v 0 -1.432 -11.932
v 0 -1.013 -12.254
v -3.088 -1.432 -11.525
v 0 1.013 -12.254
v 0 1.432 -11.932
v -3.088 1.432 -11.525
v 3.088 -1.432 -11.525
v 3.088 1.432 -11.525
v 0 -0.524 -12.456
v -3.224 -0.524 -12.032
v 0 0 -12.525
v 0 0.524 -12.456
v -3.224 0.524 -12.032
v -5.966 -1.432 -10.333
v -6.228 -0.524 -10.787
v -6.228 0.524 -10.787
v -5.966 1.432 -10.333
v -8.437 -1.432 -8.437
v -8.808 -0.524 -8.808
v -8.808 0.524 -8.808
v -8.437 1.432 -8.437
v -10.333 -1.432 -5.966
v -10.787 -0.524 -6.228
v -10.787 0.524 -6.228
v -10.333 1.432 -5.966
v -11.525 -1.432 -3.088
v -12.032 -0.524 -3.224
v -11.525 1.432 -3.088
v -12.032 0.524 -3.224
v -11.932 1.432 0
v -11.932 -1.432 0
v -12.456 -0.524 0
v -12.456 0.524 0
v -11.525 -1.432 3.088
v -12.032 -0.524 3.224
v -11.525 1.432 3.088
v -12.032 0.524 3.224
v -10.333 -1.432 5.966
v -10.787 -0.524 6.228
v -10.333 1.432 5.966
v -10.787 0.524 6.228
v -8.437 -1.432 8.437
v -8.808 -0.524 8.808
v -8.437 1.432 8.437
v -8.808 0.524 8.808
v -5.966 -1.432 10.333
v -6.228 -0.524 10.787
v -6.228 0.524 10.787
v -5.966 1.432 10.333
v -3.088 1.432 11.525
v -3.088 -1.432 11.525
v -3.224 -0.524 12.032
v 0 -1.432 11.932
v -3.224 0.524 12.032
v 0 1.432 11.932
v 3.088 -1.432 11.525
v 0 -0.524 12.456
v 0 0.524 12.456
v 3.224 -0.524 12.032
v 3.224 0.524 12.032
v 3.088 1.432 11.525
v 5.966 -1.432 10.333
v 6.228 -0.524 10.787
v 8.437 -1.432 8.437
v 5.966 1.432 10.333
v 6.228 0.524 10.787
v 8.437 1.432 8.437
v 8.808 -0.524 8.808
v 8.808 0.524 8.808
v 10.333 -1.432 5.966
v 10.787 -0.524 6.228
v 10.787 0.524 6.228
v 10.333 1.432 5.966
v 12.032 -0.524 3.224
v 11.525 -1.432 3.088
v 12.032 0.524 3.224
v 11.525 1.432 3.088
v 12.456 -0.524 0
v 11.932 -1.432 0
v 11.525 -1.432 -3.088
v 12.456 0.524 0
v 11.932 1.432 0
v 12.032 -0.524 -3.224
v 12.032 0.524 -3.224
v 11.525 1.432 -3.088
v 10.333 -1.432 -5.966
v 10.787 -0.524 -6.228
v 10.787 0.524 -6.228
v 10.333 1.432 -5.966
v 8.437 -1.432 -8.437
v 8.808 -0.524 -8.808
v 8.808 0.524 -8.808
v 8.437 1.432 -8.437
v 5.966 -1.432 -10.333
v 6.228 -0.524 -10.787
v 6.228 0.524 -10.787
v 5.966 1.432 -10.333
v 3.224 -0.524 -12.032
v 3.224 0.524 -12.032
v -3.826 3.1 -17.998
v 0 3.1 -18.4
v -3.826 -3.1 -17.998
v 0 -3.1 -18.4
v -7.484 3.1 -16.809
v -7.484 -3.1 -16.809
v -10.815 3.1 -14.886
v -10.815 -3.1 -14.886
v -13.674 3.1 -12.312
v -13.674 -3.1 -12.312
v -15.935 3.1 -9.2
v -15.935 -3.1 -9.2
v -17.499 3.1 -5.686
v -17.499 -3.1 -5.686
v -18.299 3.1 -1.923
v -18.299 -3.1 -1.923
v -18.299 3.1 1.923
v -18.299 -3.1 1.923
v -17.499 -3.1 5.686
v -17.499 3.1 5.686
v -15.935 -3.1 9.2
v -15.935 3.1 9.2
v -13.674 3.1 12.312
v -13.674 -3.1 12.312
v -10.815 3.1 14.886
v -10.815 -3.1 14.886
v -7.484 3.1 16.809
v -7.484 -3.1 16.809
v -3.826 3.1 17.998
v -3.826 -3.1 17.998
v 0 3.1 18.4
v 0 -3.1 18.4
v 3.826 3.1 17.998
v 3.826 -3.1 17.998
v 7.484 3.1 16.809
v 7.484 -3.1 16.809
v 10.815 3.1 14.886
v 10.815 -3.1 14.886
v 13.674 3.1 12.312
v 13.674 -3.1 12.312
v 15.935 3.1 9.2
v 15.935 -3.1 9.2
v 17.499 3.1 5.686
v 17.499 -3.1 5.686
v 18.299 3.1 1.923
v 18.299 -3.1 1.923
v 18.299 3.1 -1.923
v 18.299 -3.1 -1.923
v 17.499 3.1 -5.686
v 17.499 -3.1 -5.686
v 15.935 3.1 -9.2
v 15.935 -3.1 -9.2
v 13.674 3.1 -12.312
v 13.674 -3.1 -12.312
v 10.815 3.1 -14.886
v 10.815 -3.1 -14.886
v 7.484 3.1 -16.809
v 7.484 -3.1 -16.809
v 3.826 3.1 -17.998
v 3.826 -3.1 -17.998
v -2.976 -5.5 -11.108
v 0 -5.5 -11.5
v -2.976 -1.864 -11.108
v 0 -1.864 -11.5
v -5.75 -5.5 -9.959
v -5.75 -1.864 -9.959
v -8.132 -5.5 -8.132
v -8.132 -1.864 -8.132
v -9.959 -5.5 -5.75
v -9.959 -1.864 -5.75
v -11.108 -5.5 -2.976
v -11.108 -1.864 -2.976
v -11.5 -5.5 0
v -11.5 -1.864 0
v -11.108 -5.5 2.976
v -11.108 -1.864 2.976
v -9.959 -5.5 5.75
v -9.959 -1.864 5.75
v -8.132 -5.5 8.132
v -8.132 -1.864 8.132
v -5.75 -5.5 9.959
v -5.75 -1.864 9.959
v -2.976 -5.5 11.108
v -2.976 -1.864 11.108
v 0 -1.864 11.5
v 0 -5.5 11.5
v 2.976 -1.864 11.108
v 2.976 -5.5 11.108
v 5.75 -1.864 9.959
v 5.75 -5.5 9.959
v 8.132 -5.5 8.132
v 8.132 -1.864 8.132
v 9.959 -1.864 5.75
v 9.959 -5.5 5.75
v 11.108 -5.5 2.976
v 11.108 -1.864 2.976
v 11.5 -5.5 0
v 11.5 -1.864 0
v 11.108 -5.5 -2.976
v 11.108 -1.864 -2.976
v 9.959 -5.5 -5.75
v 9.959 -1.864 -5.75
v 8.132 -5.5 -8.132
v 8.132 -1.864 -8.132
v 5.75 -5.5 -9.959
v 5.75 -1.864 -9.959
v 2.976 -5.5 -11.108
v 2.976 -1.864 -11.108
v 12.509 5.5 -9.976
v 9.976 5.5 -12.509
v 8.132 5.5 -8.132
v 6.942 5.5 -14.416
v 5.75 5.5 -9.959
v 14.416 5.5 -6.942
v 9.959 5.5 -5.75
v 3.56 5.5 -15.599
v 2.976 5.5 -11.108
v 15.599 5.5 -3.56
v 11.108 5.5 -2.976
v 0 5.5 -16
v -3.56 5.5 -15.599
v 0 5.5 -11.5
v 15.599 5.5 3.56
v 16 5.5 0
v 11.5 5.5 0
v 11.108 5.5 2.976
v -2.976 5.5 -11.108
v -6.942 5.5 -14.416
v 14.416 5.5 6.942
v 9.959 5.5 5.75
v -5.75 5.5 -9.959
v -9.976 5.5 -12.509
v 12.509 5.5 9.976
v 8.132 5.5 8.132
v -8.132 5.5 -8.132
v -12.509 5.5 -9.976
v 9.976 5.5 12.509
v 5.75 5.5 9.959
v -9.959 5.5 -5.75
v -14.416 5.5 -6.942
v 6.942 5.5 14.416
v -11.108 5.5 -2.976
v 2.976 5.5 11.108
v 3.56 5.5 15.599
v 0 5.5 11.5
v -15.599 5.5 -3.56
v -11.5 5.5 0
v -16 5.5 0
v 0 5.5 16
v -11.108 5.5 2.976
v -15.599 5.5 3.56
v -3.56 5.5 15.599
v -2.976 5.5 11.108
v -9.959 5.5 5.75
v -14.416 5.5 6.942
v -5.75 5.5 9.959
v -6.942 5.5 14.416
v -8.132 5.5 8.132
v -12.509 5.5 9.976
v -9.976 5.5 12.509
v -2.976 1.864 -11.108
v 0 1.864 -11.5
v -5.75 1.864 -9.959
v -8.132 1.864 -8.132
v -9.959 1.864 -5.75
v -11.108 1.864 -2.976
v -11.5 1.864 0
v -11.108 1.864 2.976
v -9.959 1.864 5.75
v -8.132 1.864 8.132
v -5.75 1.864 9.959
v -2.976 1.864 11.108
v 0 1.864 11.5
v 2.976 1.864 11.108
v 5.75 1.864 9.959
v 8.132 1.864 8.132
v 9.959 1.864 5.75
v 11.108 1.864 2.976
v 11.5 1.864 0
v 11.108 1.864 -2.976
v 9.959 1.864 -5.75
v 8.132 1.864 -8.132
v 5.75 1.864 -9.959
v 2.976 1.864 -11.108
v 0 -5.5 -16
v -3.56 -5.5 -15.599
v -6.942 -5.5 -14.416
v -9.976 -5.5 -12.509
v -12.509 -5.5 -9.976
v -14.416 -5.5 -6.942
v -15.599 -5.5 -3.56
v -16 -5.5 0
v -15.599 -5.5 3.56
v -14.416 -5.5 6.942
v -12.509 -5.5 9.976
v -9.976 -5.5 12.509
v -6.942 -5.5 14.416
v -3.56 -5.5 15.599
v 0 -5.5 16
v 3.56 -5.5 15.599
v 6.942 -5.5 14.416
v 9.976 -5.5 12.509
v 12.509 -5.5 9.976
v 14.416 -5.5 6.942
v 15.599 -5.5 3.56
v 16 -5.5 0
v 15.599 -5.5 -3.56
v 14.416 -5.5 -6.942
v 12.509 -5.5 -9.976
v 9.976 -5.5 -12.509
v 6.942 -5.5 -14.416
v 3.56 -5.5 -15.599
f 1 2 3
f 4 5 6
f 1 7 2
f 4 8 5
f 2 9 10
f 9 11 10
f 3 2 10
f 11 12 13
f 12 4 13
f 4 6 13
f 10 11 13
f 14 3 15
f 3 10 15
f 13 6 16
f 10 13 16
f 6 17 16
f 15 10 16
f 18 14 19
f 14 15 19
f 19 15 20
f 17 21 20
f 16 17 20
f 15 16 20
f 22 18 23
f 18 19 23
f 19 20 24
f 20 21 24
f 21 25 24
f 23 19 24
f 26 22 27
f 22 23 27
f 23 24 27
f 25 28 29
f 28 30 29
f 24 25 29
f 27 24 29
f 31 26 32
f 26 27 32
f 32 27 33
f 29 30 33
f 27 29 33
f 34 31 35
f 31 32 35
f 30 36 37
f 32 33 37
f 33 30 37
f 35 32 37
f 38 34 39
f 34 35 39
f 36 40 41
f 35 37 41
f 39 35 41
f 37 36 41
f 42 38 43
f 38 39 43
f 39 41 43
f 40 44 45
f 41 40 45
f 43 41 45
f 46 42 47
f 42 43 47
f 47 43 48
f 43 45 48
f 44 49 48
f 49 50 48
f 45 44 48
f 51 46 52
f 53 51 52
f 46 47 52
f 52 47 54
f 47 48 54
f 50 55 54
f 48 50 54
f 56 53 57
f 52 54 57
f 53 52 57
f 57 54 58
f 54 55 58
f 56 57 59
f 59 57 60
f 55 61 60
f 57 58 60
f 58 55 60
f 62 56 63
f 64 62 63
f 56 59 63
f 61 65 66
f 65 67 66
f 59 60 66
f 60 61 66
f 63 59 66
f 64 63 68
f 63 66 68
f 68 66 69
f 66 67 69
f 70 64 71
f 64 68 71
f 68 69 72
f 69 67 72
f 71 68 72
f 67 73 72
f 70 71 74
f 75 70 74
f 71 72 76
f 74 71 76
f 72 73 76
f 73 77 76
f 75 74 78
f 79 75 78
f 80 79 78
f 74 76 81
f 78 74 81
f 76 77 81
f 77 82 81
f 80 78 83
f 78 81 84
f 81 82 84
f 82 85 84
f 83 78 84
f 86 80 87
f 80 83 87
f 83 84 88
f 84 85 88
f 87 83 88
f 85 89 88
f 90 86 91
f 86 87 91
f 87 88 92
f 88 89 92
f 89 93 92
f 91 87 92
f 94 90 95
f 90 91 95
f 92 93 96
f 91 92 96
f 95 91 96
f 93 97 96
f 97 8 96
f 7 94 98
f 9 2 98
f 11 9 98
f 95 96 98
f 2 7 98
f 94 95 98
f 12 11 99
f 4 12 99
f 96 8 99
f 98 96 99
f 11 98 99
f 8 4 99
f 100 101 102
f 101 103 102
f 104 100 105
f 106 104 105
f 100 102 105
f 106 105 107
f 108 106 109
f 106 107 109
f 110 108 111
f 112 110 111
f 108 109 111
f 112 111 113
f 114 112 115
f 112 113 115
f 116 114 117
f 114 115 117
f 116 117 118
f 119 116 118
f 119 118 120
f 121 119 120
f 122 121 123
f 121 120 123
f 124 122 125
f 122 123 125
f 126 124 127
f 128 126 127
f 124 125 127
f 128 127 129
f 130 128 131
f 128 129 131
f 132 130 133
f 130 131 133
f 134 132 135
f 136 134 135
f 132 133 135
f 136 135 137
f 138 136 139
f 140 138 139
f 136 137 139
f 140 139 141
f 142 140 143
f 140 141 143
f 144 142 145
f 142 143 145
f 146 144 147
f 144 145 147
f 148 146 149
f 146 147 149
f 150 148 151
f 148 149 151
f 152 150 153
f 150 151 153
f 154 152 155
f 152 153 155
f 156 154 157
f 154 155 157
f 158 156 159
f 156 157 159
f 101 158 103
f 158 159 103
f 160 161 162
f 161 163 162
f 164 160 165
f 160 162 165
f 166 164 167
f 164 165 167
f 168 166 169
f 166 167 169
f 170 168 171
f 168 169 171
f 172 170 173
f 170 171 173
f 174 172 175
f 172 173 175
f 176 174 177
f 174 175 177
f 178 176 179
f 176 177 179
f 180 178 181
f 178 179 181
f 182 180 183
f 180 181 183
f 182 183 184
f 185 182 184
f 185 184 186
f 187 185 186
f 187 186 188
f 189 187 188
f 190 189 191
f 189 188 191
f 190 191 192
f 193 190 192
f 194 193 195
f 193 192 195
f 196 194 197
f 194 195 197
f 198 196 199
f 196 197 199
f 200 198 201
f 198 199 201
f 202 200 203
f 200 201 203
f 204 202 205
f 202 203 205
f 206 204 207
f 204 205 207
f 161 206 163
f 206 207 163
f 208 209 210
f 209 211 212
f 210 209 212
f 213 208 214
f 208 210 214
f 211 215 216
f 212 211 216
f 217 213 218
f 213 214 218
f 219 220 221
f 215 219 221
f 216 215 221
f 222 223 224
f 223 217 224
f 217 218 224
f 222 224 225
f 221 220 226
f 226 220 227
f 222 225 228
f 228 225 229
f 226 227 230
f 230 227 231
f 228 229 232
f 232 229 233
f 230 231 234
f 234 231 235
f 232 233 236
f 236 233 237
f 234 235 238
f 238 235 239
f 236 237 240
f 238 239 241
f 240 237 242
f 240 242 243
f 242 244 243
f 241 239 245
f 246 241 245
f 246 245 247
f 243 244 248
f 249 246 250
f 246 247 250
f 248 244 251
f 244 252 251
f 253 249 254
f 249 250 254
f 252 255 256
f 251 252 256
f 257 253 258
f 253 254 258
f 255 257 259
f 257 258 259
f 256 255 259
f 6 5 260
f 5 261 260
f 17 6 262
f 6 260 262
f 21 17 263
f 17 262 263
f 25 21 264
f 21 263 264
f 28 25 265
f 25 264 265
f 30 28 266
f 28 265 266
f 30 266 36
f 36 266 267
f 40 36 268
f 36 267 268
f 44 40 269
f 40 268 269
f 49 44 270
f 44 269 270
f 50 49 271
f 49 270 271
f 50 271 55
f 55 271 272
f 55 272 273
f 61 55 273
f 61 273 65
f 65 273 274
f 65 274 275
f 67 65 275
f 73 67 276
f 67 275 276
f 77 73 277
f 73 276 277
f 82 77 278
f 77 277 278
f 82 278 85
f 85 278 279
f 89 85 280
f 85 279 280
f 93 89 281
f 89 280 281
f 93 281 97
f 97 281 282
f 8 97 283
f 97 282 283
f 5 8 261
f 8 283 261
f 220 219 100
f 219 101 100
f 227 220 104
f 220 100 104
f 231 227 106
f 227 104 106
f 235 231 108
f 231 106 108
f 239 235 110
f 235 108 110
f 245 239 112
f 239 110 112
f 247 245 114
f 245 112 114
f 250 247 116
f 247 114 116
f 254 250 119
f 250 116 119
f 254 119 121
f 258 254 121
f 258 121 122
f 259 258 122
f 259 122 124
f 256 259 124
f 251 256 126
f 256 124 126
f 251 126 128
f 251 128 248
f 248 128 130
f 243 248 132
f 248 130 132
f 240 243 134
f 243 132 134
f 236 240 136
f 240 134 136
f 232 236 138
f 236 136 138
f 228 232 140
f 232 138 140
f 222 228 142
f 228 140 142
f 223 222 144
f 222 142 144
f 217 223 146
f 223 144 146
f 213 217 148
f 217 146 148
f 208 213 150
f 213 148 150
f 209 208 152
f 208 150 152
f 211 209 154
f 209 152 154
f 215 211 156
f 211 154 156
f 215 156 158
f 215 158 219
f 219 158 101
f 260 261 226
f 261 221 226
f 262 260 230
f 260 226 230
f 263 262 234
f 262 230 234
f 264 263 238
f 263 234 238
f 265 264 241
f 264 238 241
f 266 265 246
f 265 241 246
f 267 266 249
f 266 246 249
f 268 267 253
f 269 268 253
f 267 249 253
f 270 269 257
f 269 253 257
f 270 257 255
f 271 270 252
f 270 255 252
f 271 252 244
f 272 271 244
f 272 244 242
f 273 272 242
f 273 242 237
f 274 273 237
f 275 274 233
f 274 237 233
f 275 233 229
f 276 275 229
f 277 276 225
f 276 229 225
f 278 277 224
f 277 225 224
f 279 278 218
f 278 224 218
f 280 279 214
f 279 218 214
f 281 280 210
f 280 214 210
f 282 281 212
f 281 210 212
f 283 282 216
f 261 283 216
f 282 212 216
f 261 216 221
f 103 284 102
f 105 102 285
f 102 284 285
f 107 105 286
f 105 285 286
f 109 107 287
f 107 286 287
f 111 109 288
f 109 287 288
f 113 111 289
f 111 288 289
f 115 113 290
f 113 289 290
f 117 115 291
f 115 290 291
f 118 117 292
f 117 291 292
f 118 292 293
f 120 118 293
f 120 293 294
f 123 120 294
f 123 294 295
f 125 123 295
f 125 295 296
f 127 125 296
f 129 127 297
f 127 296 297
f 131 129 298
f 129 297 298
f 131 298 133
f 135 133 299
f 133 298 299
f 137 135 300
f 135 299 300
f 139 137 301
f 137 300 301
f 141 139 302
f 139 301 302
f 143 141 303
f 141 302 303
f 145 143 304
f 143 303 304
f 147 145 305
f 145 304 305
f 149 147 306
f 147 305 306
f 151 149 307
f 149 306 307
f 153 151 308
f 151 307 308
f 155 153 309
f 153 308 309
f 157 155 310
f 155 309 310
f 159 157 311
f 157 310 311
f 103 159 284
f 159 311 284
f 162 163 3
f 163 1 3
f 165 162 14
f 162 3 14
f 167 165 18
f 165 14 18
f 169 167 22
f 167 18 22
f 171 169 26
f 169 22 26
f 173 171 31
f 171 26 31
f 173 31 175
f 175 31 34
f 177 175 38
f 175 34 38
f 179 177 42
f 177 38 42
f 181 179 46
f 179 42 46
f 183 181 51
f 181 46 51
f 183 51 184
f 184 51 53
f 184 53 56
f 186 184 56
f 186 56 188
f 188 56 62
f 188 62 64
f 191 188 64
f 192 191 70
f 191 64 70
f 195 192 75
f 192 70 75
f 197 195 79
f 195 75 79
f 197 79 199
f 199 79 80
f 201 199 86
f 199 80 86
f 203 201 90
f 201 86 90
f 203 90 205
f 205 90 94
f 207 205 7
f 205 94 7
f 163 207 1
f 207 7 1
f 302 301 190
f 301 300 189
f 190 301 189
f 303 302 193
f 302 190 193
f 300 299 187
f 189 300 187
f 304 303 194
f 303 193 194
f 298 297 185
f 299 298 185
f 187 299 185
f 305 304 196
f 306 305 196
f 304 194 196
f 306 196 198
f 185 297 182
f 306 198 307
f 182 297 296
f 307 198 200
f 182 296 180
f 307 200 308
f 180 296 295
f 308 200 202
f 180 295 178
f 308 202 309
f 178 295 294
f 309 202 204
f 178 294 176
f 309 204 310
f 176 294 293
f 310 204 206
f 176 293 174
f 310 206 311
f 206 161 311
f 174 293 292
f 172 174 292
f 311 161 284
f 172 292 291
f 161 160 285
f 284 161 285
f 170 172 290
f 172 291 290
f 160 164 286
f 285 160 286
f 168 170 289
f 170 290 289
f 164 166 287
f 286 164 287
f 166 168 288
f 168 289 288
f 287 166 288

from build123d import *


with BuildPart() as part:
    # Sketch2 → Revolve2 (revolve)
    with BuildSketch(Plane.XY, mode=Mode.PRIVATE) as revolve2_sk:
        with BuildLine():
            ThreePointArc((11.931891232, -1.431891232), (12.525, 0), (11.931891232, 1.431891232))
            Line((11.931891232, 1.431891232), (11.5, 1.863782464))
            Line((11.5, 1.863782464), (11.5, 5.5))
            Line((11.5, 5.5), (16, 5.5))
            Line((16, 5.5), (16, -5.5))
            Line((16, -5.5), (11.5, -5.5))
            Line((11.5, -5.5), (11.5, -1.863782464))
            Line((11.5, -1.863782464), (11.931891232, -1.431891232))
        make_face()
        Polygon((18.4, -3.1), (16, -5.5), (16, 5.5), (18.4, 3.1), align=None)
    revolve(revolve2_sk.sketch.rotate(Axis((0, 0, 0), (0, 1, 0)), 90), axis=Axis((0, 0, 0), (0, 1, 0)))


solid = part.part
